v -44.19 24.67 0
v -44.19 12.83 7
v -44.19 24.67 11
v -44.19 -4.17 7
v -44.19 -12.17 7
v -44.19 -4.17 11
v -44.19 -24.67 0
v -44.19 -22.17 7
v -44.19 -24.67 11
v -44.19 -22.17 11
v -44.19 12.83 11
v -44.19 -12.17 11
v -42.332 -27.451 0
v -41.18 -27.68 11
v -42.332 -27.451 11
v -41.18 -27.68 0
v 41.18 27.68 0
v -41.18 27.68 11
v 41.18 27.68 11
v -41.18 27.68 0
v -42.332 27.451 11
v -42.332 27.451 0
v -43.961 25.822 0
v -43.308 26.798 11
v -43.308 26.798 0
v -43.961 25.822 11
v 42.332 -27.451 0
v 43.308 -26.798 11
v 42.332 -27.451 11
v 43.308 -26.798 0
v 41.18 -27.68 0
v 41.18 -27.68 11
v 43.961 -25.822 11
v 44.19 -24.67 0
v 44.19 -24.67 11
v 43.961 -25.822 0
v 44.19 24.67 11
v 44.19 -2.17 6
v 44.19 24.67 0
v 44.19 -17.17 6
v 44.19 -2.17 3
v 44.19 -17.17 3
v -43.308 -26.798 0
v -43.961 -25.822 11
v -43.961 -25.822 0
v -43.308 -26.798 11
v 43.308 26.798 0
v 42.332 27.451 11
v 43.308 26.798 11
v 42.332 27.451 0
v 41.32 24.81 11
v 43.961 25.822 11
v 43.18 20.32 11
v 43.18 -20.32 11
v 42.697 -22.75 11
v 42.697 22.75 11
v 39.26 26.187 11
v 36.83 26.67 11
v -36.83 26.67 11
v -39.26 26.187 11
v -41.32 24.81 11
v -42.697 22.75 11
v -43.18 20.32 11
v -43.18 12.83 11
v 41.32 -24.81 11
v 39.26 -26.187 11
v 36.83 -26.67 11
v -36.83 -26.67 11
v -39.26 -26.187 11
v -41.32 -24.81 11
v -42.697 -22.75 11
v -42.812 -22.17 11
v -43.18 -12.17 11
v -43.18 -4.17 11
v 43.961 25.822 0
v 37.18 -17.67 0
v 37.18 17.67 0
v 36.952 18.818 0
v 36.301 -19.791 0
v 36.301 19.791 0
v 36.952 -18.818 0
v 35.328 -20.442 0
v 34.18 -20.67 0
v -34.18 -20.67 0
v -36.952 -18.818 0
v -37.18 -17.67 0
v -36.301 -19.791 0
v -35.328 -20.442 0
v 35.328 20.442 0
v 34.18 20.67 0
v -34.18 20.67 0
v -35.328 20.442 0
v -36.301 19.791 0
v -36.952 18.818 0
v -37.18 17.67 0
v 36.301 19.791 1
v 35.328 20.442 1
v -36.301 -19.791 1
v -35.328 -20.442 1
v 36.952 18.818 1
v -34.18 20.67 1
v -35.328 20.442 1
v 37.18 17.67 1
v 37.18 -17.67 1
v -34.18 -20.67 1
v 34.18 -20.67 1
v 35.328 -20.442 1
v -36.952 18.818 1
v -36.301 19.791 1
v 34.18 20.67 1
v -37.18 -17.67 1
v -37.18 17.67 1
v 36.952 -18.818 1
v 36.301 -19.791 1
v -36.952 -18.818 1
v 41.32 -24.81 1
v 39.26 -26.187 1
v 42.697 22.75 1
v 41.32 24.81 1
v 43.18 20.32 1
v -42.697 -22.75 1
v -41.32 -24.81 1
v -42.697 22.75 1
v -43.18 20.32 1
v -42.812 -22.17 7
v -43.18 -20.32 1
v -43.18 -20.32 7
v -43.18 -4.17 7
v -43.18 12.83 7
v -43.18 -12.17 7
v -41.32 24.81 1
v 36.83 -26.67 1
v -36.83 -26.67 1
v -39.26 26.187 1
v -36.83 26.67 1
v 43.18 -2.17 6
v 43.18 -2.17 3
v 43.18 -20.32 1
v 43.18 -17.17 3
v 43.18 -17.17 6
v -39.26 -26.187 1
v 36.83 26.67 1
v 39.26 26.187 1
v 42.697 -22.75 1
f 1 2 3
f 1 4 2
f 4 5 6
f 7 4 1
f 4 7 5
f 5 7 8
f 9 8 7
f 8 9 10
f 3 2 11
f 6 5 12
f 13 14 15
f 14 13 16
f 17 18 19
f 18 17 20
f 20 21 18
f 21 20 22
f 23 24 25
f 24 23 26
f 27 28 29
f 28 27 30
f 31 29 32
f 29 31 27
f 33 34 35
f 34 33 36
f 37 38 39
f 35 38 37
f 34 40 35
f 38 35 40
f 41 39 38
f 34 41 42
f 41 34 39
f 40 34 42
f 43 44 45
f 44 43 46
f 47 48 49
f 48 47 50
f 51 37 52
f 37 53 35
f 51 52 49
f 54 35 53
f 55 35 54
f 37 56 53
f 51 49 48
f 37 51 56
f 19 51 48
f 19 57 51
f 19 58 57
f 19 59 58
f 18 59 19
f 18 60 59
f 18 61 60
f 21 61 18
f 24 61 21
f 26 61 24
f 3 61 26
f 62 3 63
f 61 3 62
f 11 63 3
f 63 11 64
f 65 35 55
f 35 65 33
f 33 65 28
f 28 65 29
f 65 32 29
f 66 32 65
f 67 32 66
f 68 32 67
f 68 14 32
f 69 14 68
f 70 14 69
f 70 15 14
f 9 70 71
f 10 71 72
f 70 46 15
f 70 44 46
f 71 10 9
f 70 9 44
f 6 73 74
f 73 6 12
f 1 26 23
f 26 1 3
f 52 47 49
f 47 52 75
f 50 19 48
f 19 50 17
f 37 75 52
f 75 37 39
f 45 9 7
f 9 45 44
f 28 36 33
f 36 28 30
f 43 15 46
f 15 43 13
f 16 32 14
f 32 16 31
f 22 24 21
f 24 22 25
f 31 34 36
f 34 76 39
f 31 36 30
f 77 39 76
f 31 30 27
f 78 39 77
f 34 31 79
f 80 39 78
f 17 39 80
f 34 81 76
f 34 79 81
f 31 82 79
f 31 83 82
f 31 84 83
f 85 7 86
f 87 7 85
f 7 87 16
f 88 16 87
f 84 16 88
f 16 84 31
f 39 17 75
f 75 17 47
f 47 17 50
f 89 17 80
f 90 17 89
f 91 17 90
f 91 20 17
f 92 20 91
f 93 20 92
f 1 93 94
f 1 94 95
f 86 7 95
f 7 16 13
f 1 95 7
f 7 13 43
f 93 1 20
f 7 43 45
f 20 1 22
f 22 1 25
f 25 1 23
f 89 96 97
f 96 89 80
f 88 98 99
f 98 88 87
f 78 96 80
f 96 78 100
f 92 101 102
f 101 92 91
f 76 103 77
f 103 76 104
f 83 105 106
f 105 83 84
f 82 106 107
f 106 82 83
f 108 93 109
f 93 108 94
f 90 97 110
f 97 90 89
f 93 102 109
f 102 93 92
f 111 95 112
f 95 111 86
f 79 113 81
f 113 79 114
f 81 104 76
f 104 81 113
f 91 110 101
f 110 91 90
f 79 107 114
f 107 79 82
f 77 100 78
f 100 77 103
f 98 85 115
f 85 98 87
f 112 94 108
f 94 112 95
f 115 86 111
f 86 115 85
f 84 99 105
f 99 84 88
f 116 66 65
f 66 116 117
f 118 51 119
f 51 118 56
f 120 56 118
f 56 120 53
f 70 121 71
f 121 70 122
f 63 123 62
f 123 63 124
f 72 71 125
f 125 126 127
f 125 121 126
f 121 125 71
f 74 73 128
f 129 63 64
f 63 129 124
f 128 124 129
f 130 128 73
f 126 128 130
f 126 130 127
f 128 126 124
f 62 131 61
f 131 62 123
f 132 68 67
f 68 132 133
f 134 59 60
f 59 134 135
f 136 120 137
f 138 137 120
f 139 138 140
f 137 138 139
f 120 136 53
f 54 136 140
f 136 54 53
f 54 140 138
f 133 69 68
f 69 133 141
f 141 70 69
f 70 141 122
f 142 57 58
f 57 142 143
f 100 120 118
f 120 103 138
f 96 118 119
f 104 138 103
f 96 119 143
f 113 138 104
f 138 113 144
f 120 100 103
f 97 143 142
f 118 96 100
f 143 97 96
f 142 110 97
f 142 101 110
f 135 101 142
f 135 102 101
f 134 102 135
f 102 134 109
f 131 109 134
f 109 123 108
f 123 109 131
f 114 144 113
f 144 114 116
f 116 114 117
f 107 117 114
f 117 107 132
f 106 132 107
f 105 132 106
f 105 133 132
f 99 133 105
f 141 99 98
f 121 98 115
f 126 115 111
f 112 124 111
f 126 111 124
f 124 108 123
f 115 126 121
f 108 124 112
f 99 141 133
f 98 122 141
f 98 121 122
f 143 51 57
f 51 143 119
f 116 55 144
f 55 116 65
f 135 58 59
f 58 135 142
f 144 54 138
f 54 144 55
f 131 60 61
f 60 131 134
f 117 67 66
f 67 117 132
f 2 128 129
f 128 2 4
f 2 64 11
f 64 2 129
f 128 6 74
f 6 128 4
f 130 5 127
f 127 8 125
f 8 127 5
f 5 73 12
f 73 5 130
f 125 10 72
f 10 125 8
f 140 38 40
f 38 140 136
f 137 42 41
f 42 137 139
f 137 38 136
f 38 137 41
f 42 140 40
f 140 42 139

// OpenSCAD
// Fancy box for beagleboard, (c) 2010,2011 - Koen Kooi, licensed under CC-BY-SA

// Conventions: width = x, length = y, height = z

// width of PCB
inside_width = 86.36;

// lenght of PCB
inside_length = 53.34;

// outside wall thickness
edge_thickness = 1;
bottom_thickness = 1;
border_size = 8;

base_height = 10;

// Number of facets in curves, 32 is a good tradeoff between looks and processing speed
$fn=16;

// helper sizes, disable for final rendering
//helper(inside_width,inside_length,edge_thickness);
translate(v=[0,0,base_height/2]) box(inside_width, inside_length, bottom_thickness, base_height, border_size, edge_thickness);


module helper(inside_width,inside_length,edge_thickness) {
	translate(v=[0,0,-20]) cube([inside_width,inside_length,edge_thickness], center=true);
	translate(v=[-inside_width/2,0,20]) cube([edge_thickness,inside_length,edge_thickness], center=true);
}


module box(iw, il, bt, base_height, bs, et ) {

sh=0;
pcbt= 2;
box_length = inside_length + 2*et;
extra_height = 0;

	difference() {
		minkowski()
		{
		 cube([iw - 4 * et ,il - 4 * et,base_height], center=true);
		 cylinder(r=et*3.01,h=1);
		}
		minkowski()
		{
		 translate(v=[0,0, -bt]) cube([iw - 2 * bs - 2 * et, il - 2 * bs - 2 * et, base_height], center=true);
		 cylinder(r=et*3,h=1);		
		}
		//The beaglebone has 2 radii, one 1/4" and one 1/2", we pick the smallest one
		translate(v=[0,0,bt]) minkowski()
		{
			cube([iw - 25.4/2,il - 25.4/2,base_height], center=true);
			cylinder(r=25.4/4,h=0.1);
		}


      // cape
      #translate(v = [-iw/2 + 18, -il/2,-base_height/2 -0.01]) {
        //cube([60, 10, bottom_thickness * 1.1], center=false);
      }    
      #translate(v = [-iw/2 + 18, il/2 - 10 ,-base_height/2 -0.01]) {
        //cube([60, 10, bottom_thickness * 1.1], center=false);
      }   			

      //ethernet
      #translate(v = [-iw/2 -et*1.5 + -0.01, 22.5 + -il/2, sh + pcbt]) {
        cube([et *2, 17, 20], center=false);
      }
      //power
      #translate(v = [-iw/2 -et*1.5 + -0.01, 5.5 +-il/2 -et, sh + pcbt]) {
        cube([et *2, 10, 20], center=false);
      }


      //microsd: 15mm long, 12.5mm corner offset
      #translate(v = [iw/2  -0.01, 10.5 +-il/2 -et, sh - pcbt]) {
        cube([et *2, 15, pcbt * 1.5], center=false);
      }

	}
}
